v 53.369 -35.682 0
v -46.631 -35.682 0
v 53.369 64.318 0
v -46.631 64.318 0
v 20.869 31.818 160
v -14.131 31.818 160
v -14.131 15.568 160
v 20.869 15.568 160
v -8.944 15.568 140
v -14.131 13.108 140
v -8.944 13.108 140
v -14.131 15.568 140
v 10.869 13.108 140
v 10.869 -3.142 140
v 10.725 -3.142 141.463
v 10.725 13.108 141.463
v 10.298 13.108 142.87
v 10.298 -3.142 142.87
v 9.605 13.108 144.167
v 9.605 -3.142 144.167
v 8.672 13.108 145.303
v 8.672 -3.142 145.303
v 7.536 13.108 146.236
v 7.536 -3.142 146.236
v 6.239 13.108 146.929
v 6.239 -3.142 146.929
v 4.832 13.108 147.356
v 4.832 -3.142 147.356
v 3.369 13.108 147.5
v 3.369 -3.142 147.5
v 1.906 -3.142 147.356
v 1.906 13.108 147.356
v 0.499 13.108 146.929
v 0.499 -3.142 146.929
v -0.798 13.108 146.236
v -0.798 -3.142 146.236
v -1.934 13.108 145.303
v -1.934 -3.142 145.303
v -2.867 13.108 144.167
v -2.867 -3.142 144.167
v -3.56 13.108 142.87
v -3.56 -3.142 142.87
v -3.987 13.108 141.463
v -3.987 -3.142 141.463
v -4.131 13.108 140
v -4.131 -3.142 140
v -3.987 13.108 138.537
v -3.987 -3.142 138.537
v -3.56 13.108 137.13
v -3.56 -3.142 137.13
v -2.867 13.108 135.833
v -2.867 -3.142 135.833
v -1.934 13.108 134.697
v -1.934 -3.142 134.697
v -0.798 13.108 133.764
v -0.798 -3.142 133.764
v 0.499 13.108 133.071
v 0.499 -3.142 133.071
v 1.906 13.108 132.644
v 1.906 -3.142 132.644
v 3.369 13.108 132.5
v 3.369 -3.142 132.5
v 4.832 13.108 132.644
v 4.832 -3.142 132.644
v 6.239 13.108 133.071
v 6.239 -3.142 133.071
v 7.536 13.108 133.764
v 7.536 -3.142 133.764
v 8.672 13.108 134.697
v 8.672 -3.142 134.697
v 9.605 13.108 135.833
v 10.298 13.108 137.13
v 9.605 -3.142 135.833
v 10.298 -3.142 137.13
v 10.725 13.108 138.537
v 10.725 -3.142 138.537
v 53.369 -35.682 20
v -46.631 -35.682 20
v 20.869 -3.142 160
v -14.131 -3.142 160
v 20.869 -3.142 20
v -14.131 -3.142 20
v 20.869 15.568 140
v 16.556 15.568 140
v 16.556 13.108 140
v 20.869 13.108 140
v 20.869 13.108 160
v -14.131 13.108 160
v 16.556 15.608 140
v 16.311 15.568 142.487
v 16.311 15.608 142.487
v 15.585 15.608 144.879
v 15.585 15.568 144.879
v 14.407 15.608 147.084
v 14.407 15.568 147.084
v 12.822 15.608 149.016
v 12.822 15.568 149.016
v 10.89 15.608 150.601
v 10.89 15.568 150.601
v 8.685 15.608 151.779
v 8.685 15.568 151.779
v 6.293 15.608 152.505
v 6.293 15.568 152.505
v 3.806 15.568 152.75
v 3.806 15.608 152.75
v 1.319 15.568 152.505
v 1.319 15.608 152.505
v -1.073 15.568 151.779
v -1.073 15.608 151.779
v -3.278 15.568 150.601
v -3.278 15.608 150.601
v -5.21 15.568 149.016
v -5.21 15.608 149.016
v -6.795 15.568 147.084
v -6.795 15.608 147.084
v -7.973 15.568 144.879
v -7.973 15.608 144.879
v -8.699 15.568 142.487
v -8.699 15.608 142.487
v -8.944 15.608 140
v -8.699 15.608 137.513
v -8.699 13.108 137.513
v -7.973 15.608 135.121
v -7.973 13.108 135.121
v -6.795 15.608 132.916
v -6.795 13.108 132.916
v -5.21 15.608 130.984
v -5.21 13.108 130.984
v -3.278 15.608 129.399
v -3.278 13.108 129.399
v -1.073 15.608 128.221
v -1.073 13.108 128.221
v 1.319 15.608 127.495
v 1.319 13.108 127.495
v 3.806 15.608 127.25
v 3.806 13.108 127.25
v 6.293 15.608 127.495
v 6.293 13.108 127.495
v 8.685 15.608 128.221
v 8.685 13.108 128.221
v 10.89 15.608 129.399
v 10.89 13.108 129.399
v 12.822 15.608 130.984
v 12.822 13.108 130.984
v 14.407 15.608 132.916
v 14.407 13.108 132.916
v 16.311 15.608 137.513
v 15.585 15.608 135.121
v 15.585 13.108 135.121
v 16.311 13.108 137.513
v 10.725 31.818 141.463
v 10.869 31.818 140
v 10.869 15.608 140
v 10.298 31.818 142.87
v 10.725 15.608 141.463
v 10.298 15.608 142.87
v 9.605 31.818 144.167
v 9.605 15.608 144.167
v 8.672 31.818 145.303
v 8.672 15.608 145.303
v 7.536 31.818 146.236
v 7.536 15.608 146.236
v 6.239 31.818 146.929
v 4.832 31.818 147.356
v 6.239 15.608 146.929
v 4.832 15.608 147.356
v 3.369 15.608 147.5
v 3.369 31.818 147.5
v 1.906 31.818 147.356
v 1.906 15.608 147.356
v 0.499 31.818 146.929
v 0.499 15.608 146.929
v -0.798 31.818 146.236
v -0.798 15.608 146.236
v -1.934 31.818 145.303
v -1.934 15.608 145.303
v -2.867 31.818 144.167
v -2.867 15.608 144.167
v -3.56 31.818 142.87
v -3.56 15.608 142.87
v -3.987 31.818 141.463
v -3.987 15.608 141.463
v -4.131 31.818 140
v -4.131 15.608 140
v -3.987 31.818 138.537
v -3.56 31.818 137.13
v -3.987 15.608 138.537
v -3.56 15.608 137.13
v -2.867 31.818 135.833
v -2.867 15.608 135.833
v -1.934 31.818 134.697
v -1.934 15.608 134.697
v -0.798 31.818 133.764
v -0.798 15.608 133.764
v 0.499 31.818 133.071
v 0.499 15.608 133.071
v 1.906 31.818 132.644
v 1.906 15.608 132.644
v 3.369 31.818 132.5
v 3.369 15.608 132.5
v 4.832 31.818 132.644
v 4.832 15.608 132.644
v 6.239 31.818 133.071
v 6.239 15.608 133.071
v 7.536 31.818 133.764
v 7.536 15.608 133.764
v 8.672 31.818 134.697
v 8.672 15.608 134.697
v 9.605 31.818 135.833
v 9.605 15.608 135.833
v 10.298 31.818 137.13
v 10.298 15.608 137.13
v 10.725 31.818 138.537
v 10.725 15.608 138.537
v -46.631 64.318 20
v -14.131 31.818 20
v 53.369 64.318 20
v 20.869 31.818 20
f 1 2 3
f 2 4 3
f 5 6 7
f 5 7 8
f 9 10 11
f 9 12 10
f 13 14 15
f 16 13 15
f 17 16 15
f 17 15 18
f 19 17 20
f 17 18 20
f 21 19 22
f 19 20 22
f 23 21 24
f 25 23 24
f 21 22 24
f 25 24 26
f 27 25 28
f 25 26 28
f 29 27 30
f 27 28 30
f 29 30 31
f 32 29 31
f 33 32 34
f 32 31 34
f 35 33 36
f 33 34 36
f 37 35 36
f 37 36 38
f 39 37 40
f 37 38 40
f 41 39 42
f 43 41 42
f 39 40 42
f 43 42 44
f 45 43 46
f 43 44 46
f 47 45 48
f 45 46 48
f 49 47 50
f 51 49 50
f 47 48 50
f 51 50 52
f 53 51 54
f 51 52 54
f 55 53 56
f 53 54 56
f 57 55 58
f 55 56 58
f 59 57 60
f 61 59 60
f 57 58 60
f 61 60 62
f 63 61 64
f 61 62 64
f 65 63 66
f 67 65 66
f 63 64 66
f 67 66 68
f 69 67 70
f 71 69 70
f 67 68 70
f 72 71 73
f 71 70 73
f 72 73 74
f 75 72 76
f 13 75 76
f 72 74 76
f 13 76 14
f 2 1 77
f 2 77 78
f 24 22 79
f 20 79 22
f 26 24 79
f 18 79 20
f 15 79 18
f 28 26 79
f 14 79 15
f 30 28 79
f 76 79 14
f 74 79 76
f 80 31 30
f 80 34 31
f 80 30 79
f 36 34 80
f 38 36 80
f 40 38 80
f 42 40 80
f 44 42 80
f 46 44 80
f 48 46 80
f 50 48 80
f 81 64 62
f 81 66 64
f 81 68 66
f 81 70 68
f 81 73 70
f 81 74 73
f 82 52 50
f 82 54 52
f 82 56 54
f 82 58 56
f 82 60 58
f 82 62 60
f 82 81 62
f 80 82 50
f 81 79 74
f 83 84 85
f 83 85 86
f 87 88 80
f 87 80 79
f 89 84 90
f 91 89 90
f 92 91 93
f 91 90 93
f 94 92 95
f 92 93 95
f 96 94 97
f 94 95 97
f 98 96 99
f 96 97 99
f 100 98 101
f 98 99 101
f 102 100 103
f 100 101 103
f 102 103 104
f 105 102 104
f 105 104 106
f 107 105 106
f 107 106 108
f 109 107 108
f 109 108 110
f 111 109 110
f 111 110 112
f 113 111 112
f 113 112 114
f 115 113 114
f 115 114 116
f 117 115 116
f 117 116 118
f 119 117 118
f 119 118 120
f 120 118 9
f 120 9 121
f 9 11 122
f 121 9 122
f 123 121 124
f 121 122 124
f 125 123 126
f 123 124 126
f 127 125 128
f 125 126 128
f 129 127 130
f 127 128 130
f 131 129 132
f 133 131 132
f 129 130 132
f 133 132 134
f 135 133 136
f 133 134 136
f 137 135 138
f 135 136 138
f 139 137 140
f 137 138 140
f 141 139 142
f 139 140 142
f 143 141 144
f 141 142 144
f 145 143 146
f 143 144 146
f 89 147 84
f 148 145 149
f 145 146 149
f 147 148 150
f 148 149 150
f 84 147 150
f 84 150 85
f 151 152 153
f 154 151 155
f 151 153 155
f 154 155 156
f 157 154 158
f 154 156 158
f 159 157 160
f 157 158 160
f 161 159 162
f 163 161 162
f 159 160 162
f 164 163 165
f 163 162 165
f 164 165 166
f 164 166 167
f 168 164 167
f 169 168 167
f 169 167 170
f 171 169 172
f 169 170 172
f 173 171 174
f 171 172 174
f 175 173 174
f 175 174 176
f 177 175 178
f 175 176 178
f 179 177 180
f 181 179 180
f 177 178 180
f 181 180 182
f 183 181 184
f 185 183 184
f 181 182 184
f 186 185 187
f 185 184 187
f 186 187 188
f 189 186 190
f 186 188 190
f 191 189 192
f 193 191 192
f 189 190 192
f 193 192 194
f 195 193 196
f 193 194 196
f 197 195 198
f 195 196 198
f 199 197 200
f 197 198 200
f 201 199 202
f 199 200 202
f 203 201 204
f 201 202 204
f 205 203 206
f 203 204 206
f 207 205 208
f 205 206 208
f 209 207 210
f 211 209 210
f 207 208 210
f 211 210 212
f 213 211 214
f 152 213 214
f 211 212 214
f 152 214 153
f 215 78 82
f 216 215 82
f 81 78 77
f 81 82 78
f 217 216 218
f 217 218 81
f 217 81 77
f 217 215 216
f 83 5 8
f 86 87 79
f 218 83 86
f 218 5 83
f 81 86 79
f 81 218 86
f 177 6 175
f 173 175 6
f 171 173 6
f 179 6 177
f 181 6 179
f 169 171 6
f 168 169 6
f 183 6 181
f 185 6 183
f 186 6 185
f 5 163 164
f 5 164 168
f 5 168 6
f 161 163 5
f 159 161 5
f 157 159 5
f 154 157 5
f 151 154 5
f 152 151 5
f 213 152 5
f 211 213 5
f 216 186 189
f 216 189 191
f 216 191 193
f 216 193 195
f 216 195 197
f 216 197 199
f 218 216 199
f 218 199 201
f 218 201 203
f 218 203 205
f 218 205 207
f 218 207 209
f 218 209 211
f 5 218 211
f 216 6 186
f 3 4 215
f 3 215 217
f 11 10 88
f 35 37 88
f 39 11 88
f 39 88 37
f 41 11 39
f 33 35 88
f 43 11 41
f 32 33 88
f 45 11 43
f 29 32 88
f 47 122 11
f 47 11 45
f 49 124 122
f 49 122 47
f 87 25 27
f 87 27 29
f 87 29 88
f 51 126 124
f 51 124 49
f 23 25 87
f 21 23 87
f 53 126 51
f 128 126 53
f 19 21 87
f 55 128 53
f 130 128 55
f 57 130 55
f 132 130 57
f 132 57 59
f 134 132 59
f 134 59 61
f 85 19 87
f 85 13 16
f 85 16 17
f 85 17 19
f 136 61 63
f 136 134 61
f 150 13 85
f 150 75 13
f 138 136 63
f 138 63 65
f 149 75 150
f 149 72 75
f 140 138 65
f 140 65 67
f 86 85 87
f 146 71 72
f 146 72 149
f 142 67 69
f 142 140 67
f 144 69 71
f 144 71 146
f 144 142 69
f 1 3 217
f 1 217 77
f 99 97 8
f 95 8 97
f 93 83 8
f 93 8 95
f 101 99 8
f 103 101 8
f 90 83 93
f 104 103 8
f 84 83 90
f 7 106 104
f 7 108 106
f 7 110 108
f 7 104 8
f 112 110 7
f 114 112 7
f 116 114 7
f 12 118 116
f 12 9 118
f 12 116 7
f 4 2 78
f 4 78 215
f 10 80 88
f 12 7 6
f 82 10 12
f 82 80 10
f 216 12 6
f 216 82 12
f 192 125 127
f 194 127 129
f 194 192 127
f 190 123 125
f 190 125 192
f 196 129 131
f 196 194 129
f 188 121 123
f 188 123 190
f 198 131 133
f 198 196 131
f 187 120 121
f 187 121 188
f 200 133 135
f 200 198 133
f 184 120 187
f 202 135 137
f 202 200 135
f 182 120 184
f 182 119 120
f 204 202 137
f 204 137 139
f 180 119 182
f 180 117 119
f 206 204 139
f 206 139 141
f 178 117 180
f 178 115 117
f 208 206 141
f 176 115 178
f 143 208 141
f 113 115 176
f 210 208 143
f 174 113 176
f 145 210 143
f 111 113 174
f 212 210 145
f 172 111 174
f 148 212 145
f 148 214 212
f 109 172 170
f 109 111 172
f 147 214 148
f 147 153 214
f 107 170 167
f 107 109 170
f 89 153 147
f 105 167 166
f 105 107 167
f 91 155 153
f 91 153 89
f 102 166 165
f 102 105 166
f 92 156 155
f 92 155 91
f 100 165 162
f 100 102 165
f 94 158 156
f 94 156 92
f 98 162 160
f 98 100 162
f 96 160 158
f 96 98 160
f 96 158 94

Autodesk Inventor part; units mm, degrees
ref_plane "YZ Plane" through (0, 0, 0) normal (1, 0, 0) x (0, 1, 0)
ref_plane "XZ Plane" through (0, 0, 0) normal (0, 1, 0) x (-1, 0, 0)
ref_plane "XY Plane" through (0, 0, 0) normal (0, 0, 1) x (1, 0, 0)
sketch "Sketch1" plane through (0, 0, 0) normal (0, 0, 1) x (1, 0, 0)
  line L0 (-46.6309, 64.3185) -> (53.3691, 64.3185)
  line L1 (53.3691, 64.3185) -> (53.3691, -35.6815)
  line L2 (53.3691, -35.6815) -> (-46.6309, -35.6815)
  line L3 (-46.6309, -35.6815) -> (-46.6309, 64.3185)
  point P0 (0, 0)
  dimension "d0" = 100
  dimension "d1" = 100
extrude "Extrusion1" add sketch "Sketch1" along normal blind 20
sketch "Sketch2" plane through (0, 0, 20) normal (0, 0, 1) x (1, 0, 0)
  line L0 (-14.1309, 31.8185) -> (20.8691, 31.8185)
  line L1 (20.8691, 31.8185) -> (20.8691, 15.5685)
  line L2 (20.8691, 15.5685) -> (-14.1309, 15.5685)
  line L3 (-14.1309, 15.5685) -> (-14.1309, 31.8185)
  line L4 (-14.1309, 15.5685) -> (20.8691, 15.5685)
  line L5 (20.8691, 15.5685) -> (20.8691, 13.0685)
  line L6 (20.8691, 13.0685) -> (-14.1309, 13.0685)
  line L7 (-14.1309, 13.0685) -> (-14.1309, 15.5685)
  line L8 (-14.1309, 13.0685) -> (20.8691, 13.0685)
  line L9 (20.8691, 13.0685) -> (20.8691, -3.1815)
  line L10 (20.8691, -3.1815) -> (-14.1309, -3.1815)
  line L11 (-14.1309, -3.1815) -> (-14.1309, 13.0685)
  line L12 (53.3691, 64.3185) -> (-46.6309, 64.3185) projected
  line L13 (-46.6309, -35.6815) -> (53.3691, -35.6815) projected
  line L14 (53.3691, -35.6815) -> (53.3691, 64.3185) projected
  line L15 (-46.6309, 64.3185) -> (-46.6309, -35.6815) projected
  point P0 (0, 0)
  dimension "d4" = 2.5
  dimension "d5" = 16.25
  dimension "d6" = 16.25
  dimension "d7" = 32.5
  dimension "d8" = 32.5
  dimension "d9" = 32.5
  dimension "d10" = 32.5
  dimension "d11" = 48.75
extrude "Extrusion2" add sketch "Sketch2" along normal blind 140 contours L0 L1 L2 L3
sketch "Sketch3" plane through (-14.1309, 15.5685, 20) normal (0, -1, 0) x (1, 0, 0)
  circle A0 centre (17.5, 120) radius 7.5
  line L0 (-32.5, 0) -> (67.5, 0) projected
  line L1 (35, 0) -> (35, 140) projected
  point P0 (14.1309, -20)
  dimension "d14" = 120
  dimension "d15" = 15
  dimension "d16" = 17.5
extrude "Extrusion3" cut sketch "Sketch3" against normal blind 150
sketch "Sketch4" plane through (0, 0, 20) normal (0, 0, 1) x (1, 0, 0)
  point P0 (0, 0)
sketch "Sketch5" plane through (0, 0, 20) normal (0, 0, 1) x (1, 0, 0)
  line L0 (-14.1309, 15.6081) -> (20.8691, 15.6081)
  line L1 (20.8691, 15.6081) -> (20.8691, 13.1081)
  line L2 (20.8691, 13.1081) -> (-14.1309, 13.1081)
  line L3 (-14.1309, 13.1081) -> (-14.1309, 15.6081)
  line L4 (-14.1309, 31.8185) -> (-14.1309, 15.5685) projected
  point P0 (0, 0)
  dimension "d19" = 35
  dimension "d20" = 2.5
  dimension "d21" = 0
extrude "Extrusion4" add sketch "Sketch5" along normal blind 120
sketch "Sketch6" plane through (-14.1309, 13.1081, 20) normal (0, -1, 0) x (1, 0, 0)
  circle A0 centre (17.9369, 120) radius 12.75
  line L0 (-32.5, 0) -> (67.5, 0) projected
  point P0 (14.1309, -20)
  dimension "d24" = 120
  dimension "d25" = 25.5
extrude "Extrusion5" cut sketch "Sketch6" against normal blind 2.5
sketch "Sketch7" plane through (0, 0, 20) normal (0, 0, 1) x (1, 0, 0)
  line L0 (-14.1309, 15.5685) -> (-14.1309, 13.1081) projected
  line L1 (-14.1309, 13.1081) -> (20.8691, 13.1081)
  line L2 (20.8691, 13.1081) -> (20.8691, -3.1419)
  line L3 (20.8691, -3.1419) -> (-14.1309, -3.1419)
  line L4 (-14.1309, -3.1419) -> (-14.1309, 13.1081)
  point P0 (0, 0)
  dimension "d28" = 16.25
  dimension "d29" = 35
extrude "Extrusion6" add sketch "Sketch7" along normal blind 140
sketch "Sketch8" plane through (-14.1309, -3.1419, 20) normal (0, -1, 0) x (1, 0, 0)
  circle A0 centre (17.5, 120) radius 7.5
  line L0 (35, 0) -> (35, 140) projected
  line L1 (-32.5, 0) -> (67.5, 0) projected
  point P0 (14.1309, -20)
  dimension "d33" = 17.5
  dimension "d34" = 15
  dimension "d35" = 120
extrude "Extrusion7" cut sketch "Sketch8" against normal blind 16.25
equation "\"d1\" = d0"
equation "\"d6\" = d5"
equation "\"d8\" = d7"
equation "\"d10\" = d9"
properties part number "linear polariser"
